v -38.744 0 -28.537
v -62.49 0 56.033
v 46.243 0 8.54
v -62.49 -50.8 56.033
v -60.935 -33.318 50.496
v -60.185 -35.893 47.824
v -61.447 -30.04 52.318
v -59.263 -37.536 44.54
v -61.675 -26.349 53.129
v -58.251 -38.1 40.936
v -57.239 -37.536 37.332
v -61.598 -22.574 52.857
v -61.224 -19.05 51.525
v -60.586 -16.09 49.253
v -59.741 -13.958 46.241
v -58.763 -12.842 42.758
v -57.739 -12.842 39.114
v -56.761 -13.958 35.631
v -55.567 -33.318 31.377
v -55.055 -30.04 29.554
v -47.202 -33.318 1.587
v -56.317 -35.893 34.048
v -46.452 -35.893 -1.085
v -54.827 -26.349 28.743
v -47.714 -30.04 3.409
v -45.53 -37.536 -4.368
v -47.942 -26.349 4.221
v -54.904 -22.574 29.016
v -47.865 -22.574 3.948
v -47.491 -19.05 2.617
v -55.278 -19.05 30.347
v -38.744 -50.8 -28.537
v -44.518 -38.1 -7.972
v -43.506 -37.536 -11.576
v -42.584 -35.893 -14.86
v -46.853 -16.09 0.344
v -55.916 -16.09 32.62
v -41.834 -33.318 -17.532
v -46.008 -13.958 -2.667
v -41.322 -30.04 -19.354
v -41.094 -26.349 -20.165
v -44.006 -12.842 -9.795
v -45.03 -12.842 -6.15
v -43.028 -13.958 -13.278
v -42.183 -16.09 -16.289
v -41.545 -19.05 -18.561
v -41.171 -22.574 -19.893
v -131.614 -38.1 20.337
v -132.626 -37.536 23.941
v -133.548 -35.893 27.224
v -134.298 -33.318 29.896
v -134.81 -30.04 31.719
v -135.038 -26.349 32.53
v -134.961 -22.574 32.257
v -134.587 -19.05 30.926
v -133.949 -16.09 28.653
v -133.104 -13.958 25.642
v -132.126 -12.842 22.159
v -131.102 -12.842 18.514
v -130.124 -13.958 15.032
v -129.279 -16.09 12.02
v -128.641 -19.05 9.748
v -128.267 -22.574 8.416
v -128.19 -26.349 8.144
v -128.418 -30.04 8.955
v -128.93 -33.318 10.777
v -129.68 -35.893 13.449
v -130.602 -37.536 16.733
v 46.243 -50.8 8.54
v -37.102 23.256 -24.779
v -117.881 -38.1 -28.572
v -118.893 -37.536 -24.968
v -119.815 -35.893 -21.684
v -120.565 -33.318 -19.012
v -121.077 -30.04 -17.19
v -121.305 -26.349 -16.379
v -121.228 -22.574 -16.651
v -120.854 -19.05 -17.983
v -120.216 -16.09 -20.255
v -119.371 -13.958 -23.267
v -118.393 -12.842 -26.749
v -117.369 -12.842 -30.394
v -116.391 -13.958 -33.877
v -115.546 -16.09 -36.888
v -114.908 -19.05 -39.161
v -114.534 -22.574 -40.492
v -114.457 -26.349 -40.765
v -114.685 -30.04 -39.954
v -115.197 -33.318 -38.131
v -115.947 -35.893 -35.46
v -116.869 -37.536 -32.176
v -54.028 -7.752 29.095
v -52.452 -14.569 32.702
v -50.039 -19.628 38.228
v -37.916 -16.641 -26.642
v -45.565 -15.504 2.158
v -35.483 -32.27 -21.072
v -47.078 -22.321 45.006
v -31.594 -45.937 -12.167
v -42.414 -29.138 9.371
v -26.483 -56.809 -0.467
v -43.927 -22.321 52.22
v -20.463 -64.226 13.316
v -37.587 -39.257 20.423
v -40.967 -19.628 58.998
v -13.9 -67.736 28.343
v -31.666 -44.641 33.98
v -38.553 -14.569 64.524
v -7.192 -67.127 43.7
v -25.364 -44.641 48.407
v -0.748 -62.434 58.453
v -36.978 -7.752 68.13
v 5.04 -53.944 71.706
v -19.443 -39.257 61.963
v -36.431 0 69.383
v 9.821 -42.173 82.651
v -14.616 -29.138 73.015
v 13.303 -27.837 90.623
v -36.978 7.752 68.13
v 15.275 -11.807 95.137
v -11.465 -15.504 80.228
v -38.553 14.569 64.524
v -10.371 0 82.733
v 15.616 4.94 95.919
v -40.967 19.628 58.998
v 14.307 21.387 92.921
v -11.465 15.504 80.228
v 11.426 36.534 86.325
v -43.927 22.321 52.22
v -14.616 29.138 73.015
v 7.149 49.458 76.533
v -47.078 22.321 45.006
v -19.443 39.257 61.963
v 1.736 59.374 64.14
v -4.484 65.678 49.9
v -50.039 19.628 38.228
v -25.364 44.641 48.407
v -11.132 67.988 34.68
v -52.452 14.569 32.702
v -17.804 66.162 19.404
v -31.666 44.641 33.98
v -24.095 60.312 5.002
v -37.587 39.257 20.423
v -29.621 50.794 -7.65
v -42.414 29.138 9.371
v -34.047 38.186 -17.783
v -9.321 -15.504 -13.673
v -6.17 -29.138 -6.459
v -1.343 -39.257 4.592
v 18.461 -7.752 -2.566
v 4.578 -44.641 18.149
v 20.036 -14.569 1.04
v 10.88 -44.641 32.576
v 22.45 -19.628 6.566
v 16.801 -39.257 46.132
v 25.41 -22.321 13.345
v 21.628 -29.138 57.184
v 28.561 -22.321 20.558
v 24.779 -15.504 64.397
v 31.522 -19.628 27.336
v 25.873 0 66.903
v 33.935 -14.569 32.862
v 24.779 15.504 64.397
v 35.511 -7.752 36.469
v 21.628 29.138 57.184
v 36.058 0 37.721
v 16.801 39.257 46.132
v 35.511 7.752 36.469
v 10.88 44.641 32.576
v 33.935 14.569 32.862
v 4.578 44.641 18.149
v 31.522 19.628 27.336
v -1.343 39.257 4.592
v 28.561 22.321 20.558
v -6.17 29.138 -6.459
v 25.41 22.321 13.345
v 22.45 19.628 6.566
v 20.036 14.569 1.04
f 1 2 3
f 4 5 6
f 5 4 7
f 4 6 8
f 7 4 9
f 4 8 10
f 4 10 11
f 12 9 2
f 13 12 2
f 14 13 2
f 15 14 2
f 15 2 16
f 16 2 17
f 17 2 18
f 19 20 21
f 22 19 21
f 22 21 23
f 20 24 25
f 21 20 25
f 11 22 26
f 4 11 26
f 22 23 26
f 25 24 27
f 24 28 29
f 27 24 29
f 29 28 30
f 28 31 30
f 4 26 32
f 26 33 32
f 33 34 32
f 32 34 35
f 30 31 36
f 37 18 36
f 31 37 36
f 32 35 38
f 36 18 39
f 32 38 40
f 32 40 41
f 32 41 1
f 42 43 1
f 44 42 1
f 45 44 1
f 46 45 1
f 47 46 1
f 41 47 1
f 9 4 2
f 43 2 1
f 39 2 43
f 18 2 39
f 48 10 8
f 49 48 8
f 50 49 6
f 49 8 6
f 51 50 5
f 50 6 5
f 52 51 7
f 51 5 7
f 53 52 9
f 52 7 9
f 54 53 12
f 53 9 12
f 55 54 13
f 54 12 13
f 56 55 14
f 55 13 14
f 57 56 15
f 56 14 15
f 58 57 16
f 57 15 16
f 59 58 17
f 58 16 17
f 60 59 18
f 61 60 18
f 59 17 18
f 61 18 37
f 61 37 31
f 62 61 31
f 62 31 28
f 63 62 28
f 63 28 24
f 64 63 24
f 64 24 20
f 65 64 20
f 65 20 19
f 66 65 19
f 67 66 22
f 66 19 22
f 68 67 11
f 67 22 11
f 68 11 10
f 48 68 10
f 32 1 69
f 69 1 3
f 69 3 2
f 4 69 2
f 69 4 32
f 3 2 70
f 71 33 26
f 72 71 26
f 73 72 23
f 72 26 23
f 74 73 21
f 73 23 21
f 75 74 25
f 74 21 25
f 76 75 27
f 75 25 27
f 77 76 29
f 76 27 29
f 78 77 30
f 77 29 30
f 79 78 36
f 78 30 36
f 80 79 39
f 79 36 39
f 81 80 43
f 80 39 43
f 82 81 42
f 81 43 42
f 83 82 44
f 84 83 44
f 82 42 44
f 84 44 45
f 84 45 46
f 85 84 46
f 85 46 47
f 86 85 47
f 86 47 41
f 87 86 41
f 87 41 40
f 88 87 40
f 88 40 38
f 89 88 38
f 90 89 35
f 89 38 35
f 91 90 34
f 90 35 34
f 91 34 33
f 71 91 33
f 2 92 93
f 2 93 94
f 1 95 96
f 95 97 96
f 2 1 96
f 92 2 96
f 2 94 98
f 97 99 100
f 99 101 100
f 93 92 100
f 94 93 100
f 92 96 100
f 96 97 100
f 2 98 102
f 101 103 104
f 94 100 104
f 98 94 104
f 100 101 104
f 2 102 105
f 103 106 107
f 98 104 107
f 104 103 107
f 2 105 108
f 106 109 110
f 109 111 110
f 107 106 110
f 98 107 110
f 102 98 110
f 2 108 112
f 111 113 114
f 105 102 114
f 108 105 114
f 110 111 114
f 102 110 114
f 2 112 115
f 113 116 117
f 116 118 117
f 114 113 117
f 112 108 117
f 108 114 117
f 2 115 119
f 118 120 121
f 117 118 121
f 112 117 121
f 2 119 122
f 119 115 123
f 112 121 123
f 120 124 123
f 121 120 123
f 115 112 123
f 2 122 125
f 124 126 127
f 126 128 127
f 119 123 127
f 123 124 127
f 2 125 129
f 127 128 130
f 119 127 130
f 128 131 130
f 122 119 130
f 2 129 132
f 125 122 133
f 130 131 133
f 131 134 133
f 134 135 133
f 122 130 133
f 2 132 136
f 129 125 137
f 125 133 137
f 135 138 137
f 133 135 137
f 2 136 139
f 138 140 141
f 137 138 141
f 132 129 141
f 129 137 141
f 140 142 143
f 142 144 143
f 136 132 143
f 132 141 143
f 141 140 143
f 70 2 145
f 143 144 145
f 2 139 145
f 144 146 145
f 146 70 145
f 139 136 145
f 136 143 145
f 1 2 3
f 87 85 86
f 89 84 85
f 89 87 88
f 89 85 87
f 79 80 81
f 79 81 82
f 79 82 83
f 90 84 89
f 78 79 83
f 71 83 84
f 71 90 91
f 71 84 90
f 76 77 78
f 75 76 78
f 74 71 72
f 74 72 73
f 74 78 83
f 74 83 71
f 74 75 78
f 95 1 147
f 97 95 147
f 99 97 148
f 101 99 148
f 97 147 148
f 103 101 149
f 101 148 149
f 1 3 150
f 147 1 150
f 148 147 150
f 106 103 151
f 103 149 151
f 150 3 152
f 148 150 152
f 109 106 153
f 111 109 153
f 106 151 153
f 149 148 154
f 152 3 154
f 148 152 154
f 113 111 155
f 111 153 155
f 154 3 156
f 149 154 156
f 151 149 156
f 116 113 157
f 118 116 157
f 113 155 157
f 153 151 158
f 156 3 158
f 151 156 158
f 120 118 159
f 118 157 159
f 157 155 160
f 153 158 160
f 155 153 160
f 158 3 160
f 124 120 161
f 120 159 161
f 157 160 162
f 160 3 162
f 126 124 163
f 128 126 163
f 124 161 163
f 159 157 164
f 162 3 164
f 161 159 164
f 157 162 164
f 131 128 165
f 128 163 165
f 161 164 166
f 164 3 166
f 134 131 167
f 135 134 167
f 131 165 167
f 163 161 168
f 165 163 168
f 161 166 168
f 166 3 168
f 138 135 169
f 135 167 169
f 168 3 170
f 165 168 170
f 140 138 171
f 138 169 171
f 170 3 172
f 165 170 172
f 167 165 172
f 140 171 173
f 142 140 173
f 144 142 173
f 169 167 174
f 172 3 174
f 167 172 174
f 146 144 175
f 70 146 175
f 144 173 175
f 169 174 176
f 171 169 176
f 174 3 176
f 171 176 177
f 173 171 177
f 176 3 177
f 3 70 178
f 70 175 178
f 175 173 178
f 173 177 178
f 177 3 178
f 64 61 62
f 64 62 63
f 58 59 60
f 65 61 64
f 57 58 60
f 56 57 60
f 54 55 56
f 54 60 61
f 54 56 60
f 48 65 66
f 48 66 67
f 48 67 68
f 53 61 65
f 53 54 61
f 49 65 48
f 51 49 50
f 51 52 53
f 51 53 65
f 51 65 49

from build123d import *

# Parameters (mm, degrees)
F1_DEPTH = 50.8
F2_ANGLE = 340
F3_R     = 12.7
F4_DEPTH = 76.2


with BuildPart() as f1:
    # F0 (on Front) → F1 (new body)
    with BuildSketch(Plane.XZ):
        Polygon((46.242620796, 8.540305309), (-62.490016222, 56.0327209532), (-38.7438088655, -28.5371076316), align=None)
    extrude(amount=F1_DEPTH)

    # F3 (on face) → F4 (join)
    with BuildSketch(Plane(origin=(-43.3397024287, 0, -12.1692757081), x_dir=(0, -1, 0), z_dir=(-0.9627667388, 0, -0.2703335102))):
        with Locations((25.4, 4.3591374225)):
            Circle(F3_R)
        with Locations((25.4, 55.1591374225)):
            Circle(F3_R)
    extrude(amount=F4_DEPTH)


with BuildPart() as f2:
    # F0 (on Front) → F2 (revolve)
    with BuildSketch(Plane.XZ):
        Polygon((46.242620796, 8.540305309), (-62.490016222, 56.0327209532), (-38.7438088655, -28.5371076316), align=None)
    revolve(axis=Axis((-8.123697713, 0, 32.2865131311), (-0.9163989182, 0, 0.4002661898)), revolution_arc=F2_ANGLE)


solid = Compound([f1.part, f2.part])
